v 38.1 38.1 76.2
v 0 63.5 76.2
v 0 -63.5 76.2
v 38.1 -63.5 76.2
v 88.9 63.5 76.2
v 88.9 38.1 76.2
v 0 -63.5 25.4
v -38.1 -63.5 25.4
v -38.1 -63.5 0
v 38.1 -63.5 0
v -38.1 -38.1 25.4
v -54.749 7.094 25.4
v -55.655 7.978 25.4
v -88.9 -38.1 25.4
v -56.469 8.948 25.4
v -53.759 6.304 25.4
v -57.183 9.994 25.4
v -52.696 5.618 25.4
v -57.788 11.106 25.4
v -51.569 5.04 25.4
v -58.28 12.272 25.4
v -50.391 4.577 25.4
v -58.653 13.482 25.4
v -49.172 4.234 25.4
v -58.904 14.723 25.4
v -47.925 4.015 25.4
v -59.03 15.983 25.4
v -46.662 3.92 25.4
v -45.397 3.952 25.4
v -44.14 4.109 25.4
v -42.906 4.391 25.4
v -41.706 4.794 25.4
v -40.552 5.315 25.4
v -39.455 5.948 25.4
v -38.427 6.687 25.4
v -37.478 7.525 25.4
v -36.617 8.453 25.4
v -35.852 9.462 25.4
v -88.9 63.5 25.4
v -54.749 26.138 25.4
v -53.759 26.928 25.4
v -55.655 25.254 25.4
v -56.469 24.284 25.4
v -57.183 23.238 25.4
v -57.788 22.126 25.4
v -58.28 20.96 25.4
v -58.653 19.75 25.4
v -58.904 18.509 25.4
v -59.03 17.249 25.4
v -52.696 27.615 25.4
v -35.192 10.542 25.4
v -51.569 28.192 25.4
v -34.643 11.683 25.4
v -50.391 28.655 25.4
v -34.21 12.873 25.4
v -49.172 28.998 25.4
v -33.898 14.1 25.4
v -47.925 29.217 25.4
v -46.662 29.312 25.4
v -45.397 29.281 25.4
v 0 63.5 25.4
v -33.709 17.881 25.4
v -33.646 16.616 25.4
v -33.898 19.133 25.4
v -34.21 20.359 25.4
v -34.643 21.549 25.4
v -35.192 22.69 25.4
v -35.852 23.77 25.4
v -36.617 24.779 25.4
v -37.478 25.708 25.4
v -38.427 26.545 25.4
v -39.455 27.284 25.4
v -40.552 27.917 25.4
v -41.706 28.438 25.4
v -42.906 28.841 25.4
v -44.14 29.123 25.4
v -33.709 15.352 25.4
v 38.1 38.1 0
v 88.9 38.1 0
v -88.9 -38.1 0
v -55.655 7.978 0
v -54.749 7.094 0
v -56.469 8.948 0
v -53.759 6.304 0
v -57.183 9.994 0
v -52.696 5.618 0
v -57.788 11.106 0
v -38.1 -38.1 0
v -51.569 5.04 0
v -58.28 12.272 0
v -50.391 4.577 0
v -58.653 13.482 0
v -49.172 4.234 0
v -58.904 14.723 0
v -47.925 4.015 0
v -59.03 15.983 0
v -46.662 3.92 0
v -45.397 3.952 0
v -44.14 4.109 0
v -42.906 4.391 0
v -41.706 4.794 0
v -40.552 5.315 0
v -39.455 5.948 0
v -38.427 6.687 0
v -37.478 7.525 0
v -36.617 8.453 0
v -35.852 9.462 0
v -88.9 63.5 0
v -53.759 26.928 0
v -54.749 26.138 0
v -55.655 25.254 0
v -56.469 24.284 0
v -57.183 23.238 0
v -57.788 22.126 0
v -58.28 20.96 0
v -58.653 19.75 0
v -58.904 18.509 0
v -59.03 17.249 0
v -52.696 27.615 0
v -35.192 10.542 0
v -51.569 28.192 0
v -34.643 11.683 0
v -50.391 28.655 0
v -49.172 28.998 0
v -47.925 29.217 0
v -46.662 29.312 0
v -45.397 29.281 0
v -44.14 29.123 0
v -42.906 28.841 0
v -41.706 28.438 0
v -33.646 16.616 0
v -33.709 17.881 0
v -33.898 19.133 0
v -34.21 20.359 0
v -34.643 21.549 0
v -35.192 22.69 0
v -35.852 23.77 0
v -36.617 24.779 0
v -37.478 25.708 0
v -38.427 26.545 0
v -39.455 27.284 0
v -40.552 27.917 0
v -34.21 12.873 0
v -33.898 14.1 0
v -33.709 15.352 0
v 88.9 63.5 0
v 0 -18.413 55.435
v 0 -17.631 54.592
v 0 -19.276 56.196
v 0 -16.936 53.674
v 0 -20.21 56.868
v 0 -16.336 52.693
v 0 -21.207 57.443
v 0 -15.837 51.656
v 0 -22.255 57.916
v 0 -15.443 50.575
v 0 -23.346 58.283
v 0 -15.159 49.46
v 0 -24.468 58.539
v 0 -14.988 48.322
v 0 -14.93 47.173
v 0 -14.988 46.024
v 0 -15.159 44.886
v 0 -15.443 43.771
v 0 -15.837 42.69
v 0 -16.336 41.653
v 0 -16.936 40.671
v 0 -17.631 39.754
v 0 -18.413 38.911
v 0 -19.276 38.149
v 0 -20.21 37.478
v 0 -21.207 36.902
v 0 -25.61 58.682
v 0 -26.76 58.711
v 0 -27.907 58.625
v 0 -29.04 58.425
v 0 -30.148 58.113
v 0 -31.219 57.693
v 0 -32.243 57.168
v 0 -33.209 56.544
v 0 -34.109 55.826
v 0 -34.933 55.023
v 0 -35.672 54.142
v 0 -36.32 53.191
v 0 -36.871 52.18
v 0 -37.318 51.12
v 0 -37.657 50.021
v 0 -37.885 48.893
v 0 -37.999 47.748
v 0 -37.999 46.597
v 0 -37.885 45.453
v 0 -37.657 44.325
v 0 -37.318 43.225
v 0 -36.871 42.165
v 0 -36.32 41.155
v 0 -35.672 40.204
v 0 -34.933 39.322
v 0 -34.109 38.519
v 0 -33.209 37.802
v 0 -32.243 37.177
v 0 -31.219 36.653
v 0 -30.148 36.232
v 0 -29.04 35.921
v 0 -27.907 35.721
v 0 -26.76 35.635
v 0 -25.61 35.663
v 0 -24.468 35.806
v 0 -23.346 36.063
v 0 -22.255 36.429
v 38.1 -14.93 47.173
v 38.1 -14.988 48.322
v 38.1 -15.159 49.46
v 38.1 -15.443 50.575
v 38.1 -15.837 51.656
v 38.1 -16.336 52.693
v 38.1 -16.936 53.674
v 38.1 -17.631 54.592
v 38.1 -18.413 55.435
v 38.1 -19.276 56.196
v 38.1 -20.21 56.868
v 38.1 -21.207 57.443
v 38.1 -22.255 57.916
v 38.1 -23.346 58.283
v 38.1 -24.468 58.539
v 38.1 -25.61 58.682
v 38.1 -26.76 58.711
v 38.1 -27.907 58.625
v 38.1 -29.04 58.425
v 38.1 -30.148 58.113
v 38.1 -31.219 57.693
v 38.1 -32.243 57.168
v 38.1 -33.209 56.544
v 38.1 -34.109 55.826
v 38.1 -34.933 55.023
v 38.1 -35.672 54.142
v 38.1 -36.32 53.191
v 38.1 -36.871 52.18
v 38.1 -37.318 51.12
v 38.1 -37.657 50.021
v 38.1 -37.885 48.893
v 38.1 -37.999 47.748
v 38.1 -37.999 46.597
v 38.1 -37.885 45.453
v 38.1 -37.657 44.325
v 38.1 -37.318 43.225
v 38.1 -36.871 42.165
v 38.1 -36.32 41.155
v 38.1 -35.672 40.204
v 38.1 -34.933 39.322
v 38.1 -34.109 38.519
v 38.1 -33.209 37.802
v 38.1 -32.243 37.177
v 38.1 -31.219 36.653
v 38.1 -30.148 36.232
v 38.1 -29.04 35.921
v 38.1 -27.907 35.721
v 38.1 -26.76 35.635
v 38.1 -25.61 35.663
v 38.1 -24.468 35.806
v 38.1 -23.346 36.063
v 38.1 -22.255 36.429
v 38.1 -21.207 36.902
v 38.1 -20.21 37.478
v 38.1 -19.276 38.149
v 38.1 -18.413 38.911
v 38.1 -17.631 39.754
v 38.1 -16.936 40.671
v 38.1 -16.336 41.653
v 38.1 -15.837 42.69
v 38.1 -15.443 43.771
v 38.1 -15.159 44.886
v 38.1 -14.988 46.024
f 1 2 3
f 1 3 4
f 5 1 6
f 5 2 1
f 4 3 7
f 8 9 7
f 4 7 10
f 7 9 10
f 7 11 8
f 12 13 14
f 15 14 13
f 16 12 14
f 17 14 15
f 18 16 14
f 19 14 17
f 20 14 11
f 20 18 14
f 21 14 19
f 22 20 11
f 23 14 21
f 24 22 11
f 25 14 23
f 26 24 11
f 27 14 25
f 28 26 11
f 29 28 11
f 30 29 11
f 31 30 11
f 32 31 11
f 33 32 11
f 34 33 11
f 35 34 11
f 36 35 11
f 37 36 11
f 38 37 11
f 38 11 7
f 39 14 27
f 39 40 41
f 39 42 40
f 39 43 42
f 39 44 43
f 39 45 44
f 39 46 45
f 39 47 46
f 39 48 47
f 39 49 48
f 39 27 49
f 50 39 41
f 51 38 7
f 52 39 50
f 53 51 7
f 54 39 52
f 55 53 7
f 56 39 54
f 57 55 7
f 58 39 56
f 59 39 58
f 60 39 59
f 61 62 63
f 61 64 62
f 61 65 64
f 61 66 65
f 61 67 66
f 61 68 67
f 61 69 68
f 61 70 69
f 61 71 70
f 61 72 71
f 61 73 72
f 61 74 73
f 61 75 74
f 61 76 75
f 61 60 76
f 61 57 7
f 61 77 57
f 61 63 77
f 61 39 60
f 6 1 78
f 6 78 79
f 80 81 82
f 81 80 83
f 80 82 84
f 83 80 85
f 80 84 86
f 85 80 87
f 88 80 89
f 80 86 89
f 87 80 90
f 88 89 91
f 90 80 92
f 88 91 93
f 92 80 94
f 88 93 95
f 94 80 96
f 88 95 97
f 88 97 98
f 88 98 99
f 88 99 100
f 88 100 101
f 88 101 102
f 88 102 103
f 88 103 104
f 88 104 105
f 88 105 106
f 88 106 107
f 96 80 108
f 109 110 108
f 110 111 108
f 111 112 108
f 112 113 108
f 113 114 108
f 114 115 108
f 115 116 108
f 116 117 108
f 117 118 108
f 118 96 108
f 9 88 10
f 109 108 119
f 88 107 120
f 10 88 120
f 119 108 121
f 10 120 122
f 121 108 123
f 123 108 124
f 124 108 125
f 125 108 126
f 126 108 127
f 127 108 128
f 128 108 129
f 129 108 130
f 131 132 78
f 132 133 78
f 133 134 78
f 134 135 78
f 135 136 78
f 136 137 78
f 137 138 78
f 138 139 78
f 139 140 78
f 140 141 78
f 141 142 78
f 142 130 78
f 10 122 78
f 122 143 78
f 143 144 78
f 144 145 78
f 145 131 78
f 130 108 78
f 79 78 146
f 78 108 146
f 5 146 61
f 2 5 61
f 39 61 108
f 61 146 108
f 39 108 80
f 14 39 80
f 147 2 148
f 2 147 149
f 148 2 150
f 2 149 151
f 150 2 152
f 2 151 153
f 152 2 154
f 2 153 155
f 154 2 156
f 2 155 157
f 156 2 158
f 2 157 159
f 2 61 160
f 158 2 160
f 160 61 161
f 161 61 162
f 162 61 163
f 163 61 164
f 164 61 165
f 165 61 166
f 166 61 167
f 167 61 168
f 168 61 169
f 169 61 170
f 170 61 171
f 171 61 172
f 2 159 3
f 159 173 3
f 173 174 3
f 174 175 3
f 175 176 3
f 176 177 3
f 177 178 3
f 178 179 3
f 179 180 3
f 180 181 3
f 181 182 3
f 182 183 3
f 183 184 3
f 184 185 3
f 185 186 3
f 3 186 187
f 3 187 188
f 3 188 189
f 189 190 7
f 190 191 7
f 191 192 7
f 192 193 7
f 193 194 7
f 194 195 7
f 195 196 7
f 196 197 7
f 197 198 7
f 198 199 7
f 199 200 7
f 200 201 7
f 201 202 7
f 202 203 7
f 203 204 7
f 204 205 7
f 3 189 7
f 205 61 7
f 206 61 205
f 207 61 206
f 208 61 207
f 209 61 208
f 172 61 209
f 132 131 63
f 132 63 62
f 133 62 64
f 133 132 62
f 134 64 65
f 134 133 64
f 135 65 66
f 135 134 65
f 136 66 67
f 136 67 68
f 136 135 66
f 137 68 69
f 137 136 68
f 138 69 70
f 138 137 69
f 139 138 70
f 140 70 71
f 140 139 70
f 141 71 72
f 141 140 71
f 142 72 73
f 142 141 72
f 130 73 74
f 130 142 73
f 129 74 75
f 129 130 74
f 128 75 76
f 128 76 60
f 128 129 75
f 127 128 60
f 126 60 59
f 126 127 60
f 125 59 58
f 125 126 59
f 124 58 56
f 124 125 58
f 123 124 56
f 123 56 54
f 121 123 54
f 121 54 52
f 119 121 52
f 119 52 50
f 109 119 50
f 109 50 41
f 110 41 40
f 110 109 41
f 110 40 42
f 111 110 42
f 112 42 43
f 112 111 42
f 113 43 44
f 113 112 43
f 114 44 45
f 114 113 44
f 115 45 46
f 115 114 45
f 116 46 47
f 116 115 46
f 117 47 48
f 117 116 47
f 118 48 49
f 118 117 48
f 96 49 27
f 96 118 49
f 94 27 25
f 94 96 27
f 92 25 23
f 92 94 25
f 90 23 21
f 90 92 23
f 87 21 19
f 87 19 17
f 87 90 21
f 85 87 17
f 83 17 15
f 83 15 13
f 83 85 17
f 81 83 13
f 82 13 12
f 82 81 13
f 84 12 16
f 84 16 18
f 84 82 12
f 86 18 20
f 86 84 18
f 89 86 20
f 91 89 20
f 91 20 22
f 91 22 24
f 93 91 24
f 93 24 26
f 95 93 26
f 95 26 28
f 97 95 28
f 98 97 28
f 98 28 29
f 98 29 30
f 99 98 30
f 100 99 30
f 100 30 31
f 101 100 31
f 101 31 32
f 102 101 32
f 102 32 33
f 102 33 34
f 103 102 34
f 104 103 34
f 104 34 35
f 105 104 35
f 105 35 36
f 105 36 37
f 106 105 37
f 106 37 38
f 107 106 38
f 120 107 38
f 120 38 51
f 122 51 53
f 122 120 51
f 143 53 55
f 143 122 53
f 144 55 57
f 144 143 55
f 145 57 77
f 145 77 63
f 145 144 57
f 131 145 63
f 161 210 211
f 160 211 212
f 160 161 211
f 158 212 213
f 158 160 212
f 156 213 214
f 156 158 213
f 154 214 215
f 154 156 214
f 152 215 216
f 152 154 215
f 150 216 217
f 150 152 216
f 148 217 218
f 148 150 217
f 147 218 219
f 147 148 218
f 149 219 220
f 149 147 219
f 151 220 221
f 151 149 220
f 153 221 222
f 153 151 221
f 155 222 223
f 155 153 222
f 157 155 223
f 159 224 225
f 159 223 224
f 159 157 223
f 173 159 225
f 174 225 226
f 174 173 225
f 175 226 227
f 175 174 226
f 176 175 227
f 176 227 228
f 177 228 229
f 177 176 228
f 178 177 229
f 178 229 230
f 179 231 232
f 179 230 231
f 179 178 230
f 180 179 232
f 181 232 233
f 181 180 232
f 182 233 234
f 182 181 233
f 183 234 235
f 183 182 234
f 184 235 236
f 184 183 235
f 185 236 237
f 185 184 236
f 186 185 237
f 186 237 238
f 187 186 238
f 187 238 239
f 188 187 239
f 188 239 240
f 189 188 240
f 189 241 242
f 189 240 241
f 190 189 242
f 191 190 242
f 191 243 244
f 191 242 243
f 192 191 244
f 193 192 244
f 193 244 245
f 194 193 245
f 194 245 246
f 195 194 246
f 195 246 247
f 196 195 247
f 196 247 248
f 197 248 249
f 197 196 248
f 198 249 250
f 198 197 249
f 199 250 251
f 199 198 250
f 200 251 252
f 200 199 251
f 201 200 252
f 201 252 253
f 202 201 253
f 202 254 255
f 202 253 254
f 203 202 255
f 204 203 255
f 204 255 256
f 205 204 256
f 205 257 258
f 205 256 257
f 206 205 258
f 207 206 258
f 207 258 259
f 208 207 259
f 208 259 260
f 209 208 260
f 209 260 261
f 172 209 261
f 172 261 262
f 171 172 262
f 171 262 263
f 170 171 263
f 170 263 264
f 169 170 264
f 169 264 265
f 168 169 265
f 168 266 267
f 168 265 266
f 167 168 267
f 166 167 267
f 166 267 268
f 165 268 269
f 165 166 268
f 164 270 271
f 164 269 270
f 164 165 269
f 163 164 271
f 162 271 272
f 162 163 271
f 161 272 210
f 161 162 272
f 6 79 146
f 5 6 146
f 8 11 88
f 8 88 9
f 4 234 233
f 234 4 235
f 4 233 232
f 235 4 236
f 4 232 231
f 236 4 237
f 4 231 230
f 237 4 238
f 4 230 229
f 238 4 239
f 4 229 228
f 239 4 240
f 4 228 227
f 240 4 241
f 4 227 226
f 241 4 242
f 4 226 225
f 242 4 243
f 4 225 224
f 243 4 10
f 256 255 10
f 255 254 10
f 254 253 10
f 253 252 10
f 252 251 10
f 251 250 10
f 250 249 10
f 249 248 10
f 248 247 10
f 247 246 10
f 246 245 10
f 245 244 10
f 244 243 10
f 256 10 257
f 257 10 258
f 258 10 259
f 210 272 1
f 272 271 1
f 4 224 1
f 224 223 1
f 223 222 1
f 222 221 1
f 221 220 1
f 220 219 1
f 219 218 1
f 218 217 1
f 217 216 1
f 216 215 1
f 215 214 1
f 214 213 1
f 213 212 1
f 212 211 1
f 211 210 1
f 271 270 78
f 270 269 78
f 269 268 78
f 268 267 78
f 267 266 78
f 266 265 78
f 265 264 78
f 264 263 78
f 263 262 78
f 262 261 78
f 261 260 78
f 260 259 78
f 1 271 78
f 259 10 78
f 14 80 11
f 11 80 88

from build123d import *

# Parameters (mm, degrees)
F0_R     = 12.7
F1_DEPTH = 25.4
F2_DEPTH = 76.2
F3_R     = 11.5415853334
F4_DEPTH = 97.028


with BuildPart() as f1:
    # F0 (on Top) → F1 (new body)
    with BuildSketch(Plane.XY):
        Polygon((0, -63.5), (0, 63.5), (-88.9, 63.5), (-88.9, -38.1), (-38.1, -38.1), (-38.1, -63.5), align=None)
        with Locations((-46.3457293808, 16.616050154)):
            Circle(F0_R, mode=Mode.SUBTRACT)
    extrude(amount=F1_DEPTH)

    # F0 (on Top) → F2 (join)
    with BuildSketch(Plane.XY):
        Polygon((88.9, 38.1), (88.9, 63.5), (0, 63.5), (0, -63.5), (38.1, -63.5), (38.1, 38.1), align=None)
    extrude(amount=F2_DEPTH)

    # F3 (on Right) → F4 (cut)
    with BuildSketch(Plane.YZ):
        with Locations((-26.4720246196, 47.1727401018)):
            Circle(F3_R)
    extrude(amount=F4_DEPTH, mode=Mode.SUBTRACT)


solid = f1.part
